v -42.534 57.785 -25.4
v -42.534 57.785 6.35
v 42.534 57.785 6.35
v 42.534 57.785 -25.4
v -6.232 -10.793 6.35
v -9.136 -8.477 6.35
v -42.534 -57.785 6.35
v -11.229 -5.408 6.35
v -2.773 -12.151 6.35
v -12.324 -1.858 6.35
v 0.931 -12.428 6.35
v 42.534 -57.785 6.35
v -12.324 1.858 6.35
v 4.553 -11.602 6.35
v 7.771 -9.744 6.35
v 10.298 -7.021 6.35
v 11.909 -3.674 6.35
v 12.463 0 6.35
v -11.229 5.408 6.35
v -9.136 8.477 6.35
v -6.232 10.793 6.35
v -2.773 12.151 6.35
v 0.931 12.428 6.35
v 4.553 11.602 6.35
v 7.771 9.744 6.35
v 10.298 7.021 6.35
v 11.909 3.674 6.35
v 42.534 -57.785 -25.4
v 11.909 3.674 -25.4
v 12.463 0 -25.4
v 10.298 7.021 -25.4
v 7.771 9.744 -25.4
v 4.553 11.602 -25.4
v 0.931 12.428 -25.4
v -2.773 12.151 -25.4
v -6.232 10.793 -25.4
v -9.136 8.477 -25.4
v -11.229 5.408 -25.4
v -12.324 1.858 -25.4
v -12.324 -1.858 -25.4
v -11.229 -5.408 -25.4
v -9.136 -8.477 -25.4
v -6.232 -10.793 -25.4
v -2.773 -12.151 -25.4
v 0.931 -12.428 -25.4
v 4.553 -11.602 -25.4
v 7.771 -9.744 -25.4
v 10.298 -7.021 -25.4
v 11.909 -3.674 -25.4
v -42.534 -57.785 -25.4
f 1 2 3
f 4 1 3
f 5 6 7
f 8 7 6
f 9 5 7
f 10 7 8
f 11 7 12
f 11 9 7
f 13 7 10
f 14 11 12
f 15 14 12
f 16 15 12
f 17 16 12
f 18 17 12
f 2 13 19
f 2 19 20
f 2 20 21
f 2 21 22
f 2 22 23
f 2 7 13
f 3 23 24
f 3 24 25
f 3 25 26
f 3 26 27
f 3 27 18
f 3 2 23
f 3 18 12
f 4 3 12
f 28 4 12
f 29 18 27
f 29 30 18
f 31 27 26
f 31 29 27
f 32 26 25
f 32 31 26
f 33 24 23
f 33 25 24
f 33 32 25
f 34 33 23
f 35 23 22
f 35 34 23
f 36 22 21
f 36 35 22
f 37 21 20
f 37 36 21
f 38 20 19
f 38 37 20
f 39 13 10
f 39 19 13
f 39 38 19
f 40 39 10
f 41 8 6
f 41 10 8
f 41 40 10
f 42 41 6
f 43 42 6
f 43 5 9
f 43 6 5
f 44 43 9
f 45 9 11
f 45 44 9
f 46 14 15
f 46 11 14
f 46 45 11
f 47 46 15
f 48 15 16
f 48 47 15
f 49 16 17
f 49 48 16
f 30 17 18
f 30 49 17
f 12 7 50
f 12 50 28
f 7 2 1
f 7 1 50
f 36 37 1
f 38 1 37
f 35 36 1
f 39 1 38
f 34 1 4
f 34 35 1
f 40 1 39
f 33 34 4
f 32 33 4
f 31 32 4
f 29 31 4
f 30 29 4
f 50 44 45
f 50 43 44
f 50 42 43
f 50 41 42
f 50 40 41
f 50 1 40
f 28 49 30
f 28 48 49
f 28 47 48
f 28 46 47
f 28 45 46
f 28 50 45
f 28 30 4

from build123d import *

# Parameters (mm, degrees)
F0_W       = 85.0676417184
F0_H       = 115.57
F1_DEPTH   = 6.35
F2_R       = 12.4631910905
F3_DEPTH   = 6.351
F1_FACE1_W = 85.0676417184
F1_FACE1_H = 115.57
F1_FACE1_R = 12.4631910905
F4_W       = 85.0676417184
F4_H       = 115.57
F4_R       = 12.4631910905
F4_R_2     = 12.0047888383
F5_DEPTH   = 25.4


with BuildPart() as f1:
    # F0 (on Top) → F1 (new body)
    with BuildSketch(Plane.XY):
        Rectangle(F0_W, F0_H)
    extrude(amount=F1_DEPTH)

    # F2 (on Top) → F3 (cut, through all)
    with BuildSketch(Plane.XY):
        Circle(F2_R)
    extrude(amount=F3_DEPTH, mode=Mode.SUBTRACT)

    # F1_face1 (on face) + F4 (on face) → F5 (join)
    with BuildSketch(Plane(origin=(0, 0, 0), x_dir=(1, 0, 0), z_dir=(0, 0, -1))):
        Rectangle(F1_FACE1_W, F1_FACE1_H)
        Circle(F1_FACE1_R, mode=Mode.SUBTRACT)
    with BuildSketch(Plane.XY.offset(6.35)):
        Rectangle(F4_W, F4_H)
        Circle(F4_R, mode=Mode.SUBTRACT)
        with Locations((30.233990401, 0)):
            Circle(F4_R_2, mode=Mode.SUBTRACT)
    extrude(amount=F5_DEPTH, dir=(0, 0, -1))


solid = f1.part
